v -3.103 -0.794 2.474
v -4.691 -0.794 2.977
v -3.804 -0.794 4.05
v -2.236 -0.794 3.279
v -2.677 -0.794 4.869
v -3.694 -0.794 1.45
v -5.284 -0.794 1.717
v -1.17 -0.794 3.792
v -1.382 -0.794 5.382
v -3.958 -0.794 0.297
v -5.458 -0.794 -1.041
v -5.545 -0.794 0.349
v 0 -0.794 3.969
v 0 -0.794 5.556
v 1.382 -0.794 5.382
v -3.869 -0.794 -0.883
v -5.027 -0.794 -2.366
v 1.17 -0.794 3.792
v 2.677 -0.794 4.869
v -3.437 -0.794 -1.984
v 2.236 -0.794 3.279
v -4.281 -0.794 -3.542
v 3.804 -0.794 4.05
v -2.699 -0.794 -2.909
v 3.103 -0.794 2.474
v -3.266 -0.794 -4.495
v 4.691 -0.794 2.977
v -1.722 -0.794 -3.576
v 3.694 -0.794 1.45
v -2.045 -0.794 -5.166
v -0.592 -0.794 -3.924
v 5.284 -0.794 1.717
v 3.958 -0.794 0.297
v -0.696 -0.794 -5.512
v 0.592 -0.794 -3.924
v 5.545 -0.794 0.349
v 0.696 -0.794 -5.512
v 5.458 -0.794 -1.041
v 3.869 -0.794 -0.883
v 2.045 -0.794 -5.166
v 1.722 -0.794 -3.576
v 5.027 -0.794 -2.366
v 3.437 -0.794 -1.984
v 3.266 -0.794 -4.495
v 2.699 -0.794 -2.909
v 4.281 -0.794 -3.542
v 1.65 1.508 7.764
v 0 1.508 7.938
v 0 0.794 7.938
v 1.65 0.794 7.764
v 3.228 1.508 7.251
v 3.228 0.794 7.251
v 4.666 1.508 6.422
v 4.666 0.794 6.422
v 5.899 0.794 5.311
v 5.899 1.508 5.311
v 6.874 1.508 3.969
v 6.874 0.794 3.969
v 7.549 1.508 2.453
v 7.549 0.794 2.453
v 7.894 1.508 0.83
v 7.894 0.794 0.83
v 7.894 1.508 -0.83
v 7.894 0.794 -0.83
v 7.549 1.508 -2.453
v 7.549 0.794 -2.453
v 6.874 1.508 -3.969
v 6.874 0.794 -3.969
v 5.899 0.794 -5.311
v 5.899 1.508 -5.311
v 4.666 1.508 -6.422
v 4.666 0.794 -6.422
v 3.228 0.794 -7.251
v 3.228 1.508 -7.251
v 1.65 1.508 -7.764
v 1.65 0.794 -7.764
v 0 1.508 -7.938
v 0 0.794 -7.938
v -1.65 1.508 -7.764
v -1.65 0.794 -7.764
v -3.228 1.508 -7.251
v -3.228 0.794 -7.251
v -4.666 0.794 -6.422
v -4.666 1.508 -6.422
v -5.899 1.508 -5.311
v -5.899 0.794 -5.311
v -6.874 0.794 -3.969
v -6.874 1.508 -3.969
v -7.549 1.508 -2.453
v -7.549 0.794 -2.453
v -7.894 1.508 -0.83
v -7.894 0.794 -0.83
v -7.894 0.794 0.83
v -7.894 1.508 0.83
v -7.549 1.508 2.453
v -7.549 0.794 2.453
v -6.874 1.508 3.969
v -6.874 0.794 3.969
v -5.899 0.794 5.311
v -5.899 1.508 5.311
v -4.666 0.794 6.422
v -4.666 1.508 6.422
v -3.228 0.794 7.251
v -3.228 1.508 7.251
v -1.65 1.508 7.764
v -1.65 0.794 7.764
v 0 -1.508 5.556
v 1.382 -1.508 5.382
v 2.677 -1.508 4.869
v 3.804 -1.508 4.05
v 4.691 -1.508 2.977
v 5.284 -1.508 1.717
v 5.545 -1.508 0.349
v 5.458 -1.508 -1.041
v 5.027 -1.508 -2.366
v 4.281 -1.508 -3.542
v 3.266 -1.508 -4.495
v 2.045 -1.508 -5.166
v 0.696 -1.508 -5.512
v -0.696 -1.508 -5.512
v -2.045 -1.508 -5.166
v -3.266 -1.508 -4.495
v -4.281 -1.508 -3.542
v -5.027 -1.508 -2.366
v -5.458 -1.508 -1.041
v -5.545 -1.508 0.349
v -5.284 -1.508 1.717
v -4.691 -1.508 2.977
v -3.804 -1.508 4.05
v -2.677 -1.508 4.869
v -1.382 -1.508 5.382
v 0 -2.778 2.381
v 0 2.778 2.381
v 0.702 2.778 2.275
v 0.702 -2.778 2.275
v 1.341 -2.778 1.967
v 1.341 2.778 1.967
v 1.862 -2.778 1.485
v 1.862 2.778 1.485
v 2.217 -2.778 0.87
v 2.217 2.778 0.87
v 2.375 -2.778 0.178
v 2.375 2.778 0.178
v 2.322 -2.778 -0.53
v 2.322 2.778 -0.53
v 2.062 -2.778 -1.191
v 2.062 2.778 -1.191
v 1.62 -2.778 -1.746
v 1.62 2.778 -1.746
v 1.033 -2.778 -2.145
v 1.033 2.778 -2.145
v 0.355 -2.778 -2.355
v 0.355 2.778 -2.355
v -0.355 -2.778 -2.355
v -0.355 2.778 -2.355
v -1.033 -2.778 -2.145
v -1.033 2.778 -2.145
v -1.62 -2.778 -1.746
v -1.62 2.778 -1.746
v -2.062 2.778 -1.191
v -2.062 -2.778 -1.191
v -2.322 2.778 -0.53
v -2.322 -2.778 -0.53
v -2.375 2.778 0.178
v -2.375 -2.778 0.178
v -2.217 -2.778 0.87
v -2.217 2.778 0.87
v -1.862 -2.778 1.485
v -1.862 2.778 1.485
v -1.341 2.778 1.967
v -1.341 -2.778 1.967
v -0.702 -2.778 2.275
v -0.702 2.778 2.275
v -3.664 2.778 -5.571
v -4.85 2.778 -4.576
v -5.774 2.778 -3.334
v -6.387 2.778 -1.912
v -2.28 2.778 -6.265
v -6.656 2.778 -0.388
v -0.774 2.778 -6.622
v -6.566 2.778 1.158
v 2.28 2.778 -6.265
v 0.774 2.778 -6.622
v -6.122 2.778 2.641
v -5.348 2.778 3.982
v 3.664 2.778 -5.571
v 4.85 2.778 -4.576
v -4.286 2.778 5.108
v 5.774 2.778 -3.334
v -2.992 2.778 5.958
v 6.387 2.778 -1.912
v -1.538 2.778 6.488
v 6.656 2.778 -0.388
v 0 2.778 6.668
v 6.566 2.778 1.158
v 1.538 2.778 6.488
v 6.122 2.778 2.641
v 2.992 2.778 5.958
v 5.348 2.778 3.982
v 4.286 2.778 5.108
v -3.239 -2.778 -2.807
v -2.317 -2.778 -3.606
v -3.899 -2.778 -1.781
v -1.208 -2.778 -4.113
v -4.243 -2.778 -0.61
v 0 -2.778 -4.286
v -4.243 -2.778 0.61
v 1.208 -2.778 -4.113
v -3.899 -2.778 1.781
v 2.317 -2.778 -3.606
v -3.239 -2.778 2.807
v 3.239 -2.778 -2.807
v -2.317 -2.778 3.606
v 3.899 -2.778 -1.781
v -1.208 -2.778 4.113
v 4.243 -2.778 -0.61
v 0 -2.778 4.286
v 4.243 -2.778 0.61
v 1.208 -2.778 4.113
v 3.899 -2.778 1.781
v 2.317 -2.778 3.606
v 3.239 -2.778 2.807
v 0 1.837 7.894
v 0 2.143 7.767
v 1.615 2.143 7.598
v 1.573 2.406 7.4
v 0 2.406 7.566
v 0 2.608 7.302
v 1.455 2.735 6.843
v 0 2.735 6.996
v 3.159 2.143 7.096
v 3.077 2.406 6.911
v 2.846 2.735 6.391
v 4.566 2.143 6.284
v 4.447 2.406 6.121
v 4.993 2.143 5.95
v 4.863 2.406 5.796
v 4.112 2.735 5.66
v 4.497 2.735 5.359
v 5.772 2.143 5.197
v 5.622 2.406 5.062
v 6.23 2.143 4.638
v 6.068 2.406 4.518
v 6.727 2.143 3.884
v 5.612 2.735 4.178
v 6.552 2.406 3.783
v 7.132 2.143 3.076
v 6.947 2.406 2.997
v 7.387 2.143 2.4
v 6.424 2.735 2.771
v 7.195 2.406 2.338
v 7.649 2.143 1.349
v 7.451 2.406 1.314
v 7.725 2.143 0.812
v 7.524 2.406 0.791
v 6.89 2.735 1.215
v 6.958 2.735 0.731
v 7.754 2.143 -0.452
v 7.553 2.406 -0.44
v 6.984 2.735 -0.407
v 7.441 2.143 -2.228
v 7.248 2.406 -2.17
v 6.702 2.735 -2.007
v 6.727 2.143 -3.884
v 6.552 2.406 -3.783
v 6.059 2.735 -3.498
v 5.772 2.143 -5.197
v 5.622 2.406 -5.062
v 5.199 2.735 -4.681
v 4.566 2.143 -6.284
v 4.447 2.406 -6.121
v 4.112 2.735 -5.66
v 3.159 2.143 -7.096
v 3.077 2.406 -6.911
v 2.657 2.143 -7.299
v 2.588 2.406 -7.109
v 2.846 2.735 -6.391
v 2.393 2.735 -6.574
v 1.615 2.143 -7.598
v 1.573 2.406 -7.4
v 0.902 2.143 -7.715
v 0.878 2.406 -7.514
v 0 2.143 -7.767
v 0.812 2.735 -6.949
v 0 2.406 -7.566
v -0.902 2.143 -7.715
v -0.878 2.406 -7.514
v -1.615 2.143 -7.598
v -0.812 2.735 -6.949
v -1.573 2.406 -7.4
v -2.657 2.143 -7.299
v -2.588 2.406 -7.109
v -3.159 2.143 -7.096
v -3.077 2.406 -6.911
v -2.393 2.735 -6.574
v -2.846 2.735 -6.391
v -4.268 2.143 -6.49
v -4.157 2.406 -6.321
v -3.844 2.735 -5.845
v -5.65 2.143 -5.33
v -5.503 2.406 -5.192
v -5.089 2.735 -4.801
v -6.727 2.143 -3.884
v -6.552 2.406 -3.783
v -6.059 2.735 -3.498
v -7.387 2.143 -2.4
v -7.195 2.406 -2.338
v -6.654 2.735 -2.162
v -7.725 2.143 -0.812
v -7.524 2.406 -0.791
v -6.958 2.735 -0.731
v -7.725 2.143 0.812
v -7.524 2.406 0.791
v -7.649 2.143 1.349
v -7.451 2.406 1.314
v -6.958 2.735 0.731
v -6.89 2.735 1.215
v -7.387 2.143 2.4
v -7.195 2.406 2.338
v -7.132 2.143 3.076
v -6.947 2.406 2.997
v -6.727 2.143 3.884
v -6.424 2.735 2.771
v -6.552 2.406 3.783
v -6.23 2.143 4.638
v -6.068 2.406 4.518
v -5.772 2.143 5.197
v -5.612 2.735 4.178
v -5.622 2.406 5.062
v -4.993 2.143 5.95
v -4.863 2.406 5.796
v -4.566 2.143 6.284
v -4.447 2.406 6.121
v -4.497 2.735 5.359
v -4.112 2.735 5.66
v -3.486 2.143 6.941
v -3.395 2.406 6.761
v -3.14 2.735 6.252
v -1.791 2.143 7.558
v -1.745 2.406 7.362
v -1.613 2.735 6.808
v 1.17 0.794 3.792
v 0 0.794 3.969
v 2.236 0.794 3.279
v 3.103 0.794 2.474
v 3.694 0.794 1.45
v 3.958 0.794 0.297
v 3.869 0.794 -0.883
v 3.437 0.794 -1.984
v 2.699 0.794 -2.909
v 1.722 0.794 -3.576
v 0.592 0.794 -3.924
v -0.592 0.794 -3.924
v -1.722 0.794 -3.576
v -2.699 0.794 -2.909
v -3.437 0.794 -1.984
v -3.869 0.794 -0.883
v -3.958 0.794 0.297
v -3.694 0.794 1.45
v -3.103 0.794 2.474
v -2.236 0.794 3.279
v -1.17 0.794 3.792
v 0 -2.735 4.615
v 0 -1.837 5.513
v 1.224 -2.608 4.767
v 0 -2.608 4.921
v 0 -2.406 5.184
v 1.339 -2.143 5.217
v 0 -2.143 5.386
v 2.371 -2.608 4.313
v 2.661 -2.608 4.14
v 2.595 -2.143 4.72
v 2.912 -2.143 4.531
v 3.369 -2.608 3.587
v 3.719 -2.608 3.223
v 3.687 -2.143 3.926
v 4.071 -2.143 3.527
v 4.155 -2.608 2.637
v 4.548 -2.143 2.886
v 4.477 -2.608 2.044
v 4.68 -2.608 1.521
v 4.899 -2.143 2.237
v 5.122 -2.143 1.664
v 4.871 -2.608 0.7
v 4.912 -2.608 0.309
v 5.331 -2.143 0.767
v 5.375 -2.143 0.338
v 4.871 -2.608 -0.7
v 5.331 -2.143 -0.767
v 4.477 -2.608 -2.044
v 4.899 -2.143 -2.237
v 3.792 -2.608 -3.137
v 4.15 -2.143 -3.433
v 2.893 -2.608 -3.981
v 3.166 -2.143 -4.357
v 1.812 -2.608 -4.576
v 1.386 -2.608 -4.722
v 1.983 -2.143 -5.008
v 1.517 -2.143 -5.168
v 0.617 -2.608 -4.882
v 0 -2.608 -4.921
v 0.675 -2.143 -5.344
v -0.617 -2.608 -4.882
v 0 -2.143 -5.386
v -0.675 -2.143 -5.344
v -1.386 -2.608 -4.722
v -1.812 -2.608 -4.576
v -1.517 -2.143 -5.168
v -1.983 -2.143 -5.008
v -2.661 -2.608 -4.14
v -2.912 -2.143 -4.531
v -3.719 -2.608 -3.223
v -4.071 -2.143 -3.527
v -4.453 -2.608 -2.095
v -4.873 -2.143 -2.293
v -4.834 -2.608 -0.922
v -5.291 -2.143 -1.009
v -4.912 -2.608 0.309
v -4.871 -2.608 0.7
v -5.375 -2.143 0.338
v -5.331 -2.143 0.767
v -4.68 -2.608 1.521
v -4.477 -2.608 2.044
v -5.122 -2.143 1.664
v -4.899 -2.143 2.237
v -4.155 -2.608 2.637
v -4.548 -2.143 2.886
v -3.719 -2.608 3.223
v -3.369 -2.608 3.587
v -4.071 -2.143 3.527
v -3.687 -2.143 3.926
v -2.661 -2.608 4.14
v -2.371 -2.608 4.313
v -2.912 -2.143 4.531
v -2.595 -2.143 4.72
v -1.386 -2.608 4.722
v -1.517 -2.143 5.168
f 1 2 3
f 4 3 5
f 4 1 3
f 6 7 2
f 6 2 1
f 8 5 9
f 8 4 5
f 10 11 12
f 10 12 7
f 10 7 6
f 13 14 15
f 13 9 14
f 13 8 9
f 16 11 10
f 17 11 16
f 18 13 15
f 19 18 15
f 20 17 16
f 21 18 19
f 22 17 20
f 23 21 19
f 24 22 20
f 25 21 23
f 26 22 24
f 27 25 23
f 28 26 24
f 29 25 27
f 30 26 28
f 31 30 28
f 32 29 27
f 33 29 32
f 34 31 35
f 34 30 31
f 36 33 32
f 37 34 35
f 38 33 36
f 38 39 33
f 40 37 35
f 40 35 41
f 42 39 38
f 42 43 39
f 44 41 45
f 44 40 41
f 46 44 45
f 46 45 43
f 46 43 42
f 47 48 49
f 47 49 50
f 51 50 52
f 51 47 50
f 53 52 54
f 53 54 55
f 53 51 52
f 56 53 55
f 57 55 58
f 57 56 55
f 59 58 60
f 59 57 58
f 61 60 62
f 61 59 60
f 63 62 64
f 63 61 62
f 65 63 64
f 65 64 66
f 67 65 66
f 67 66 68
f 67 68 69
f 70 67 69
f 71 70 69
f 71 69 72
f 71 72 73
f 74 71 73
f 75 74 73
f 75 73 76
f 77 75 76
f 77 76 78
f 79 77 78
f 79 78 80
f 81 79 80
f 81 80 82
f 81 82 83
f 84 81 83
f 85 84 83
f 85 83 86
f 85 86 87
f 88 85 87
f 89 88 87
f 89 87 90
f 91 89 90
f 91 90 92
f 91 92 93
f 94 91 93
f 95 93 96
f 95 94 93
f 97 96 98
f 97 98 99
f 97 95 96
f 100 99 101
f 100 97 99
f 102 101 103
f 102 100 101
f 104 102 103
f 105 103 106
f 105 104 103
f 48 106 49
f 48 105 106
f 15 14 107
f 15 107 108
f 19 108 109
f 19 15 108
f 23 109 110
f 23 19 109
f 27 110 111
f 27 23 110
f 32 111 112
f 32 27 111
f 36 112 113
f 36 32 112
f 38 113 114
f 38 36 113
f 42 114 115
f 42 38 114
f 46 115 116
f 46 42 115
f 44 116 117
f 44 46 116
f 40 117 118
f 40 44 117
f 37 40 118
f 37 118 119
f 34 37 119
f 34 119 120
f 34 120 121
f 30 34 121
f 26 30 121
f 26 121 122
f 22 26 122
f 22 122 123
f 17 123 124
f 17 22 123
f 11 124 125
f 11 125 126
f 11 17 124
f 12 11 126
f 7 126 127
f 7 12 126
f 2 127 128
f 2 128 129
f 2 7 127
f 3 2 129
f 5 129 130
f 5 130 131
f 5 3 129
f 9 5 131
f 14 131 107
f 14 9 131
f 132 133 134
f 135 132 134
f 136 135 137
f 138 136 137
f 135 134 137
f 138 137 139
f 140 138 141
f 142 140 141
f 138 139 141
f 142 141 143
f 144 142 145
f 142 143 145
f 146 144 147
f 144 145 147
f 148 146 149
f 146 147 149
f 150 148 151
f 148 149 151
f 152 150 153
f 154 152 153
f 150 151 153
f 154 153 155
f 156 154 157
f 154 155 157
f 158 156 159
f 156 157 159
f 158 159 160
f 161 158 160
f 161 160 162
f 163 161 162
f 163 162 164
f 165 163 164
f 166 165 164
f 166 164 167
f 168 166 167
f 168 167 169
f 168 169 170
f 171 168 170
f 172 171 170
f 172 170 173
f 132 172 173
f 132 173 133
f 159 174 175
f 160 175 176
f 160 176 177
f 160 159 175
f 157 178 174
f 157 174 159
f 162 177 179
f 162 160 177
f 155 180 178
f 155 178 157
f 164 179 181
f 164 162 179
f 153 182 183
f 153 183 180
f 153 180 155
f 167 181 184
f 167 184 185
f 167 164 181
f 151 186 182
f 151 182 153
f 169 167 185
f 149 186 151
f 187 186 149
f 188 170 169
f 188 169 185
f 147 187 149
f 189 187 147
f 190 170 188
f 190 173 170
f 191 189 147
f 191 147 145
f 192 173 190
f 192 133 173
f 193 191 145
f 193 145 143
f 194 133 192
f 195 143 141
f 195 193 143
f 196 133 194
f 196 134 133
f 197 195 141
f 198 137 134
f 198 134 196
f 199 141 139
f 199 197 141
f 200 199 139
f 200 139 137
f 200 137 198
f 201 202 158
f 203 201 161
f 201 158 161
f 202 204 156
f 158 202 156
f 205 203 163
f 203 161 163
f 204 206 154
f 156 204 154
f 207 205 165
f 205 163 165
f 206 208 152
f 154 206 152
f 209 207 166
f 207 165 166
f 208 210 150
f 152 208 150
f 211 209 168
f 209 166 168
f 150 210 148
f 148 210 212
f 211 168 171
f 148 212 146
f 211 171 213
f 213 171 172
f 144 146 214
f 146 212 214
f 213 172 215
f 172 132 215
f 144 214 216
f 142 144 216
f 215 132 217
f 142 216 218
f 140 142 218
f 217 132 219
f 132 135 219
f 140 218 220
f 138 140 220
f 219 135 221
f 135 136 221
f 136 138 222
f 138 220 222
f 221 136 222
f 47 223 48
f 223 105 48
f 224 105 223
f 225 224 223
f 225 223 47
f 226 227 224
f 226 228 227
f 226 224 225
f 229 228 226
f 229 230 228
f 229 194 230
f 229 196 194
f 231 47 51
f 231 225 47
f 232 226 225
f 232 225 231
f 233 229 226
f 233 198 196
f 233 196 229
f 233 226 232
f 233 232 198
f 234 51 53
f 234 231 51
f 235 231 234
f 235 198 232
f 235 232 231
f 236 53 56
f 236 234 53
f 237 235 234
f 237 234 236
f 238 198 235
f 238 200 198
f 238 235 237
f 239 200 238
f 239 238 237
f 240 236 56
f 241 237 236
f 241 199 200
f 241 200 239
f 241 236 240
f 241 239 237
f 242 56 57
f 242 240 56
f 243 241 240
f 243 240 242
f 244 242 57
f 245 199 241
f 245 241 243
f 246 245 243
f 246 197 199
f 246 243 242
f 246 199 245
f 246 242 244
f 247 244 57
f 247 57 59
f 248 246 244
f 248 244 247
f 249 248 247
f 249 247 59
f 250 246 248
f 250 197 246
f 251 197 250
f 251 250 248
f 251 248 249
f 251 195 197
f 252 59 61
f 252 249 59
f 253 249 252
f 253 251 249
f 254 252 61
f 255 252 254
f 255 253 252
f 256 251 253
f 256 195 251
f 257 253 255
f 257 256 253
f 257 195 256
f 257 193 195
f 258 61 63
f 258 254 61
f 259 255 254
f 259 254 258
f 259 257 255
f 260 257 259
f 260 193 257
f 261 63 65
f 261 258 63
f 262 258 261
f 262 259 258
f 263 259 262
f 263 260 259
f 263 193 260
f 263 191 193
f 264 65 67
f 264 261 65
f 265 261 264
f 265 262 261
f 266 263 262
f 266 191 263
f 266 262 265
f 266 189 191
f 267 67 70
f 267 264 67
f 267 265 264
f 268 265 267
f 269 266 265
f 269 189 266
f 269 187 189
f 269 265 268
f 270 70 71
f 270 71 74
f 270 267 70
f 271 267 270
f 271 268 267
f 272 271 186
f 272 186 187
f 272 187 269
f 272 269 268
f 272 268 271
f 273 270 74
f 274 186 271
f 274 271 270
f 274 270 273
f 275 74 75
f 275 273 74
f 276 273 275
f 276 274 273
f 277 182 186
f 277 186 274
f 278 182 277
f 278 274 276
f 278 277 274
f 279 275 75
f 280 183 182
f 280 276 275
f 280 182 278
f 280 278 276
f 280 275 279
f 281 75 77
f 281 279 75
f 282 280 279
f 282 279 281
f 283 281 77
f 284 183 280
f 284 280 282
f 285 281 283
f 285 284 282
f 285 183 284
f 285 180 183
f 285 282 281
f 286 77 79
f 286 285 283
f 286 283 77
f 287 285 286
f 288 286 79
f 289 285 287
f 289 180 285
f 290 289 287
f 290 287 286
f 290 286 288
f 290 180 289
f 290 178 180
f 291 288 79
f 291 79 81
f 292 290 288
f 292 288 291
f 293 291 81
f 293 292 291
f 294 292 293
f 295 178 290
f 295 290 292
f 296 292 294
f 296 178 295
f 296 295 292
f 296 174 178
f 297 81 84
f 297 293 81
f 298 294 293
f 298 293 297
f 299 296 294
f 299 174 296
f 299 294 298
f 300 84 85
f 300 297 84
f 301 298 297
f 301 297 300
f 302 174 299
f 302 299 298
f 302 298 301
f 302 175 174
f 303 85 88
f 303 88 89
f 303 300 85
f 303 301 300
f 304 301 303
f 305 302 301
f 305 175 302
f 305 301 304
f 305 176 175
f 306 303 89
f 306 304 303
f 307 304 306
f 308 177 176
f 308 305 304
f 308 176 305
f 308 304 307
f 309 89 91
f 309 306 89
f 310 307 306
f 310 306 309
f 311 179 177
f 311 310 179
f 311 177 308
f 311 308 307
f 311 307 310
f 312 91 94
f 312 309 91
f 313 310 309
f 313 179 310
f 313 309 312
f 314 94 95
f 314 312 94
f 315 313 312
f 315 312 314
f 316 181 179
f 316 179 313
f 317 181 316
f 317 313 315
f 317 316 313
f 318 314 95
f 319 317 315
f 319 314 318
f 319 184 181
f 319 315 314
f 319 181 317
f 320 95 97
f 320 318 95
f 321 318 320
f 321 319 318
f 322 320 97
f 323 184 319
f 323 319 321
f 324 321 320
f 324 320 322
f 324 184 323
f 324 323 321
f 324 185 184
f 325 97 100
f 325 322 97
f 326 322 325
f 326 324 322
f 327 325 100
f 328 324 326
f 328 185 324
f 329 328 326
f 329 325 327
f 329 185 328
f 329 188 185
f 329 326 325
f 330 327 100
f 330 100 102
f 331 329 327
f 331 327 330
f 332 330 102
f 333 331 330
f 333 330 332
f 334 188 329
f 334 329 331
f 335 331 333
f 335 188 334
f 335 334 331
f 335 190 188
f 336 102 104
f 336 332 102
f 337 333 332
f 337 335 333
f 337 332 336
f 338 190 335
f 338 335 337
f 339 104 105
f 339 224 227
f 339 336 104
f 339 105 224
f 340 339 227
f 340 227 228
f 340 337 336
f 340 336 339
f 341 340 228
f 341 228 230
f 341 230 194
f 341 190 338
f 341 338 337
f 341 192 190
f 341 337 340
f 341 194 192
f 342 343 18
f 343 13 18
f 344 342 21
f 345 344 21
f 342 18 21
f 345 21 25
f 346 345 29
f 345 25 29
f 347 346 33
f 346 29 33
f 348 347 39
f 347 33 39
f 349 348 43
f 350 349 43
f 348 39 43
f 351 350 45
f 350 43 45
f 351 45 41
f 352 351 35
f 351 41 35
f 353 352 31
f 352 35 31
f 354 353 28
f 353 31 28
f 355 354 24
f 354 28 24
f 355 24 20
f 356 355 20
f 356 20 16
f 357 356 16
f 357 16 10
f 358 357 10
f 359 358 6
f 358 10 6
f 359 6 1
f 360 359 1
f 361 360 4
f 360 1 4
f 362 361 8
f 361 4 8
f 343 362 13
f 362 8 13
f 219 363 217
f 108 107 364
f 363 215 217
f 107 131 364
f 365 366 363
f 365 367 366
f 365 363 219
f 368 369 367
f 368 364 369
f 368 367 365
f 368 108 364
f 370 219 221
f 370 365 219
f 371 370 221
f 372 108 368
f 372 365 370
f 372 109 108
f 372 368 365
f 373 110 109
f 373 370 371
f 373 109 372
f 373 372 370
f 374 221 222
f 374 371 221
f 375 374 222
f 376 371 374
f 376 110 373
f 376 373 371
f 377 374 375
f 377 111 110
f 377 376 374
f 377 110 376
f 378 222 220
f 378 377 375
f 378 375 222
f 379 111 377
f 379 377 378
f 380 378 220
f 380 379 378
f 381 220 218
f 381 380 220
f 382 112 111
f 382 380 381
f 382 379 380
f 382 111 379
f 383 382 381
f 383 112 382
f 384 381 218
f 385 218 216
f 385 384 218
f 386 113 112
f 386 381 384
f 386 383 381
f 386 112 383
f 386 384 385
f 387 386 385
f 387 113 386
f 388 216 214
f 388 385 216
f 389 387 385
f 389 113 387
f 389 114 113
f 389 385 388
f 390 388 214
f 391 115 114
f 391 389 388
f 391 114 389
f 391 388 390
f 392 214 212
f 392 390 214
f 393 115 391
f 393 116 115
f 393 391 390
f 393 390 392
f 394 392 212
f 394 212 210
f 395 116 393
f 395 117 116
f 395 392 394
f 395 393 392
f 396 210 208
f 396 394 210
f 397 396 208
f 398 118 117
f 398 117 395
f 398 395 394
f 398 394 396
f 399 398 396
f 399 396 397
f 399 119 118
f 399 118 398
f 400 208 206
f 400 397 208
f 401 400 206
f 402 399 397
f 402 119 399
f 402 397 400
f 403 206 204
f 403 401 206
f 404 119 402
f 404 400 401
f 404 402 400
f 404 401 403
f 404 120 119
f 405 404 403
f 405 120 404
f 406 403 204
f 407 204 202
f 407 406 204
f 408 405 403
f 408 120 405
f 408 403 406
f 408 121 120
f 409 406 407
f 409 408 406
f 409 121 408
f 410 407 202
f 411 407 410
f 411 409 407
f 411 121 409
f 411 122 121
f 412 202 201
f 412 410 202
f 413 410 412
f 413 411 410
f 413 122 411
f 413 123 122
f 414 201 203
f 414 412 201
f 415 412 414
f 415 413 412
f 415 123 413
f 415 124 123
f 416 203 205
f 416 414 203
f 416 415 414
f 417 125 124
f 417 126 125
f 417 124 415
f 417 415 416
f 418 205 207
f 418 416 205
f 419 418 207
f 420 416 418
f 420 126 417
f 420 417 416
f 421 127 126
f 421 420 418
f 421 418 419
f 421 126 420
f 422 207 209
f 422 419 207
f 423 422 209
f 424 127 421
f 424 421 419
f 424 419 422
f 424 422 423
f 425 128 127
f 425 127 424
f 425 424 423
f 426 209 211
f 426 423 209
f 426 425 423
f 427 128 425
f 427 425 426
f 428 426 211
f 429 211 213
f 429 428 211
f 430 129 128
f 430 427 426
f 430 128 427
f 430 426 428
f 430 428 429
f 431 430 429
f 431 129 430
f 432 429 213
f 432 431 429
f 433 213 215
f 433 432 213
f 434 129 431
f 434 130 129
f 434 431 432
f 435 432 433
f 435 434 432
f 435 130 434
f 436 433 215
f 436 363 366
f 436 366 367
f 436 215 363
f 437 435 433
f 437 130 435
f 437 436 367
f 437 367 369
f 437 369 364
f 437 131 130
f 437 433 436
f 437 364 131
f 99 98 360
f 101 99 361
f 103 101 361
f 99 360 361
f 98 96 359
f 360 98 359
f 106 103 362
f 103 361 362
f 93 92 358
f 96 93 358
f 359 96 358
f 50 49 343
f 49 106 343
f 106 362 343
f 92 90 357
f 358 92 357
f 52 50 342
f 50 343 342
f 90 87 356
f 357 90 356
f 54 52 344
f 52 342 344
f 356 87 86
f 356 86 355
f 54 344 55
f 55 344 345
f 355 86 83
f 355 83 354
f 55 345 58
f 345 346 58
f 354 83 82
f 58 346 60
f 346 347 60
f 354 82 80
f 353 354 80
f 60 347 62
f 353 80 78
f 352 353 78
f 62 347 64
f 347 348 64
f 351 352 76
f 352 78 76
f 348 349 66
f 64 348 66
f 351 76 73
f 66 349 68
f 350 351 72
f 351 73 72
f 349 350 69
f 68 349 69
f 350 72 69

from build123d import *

# Parameters (mm, degrees)
SKETCH1_R           = 5.55625
BOSS_EXTRUDE1_DEPTH = 2.778125
SKETCH2_R           = 7.9375
BOSS_EXTRUDE2_DEPTH = 2.54
SKETCH3_R           = 8.070808391
SKETCH3_R_2         = 3.96875
CUT_EXTRUDE1_DEPTH  = 0.79375
SKETCH4_R           = 2.38125
CUT_EXTRUDE2_DEPTH  = 13.525163734
FILLET1_R           = 1.27


with BuildPart() as part:
    # Sketch1 → Boss-Extrude1 (new, symmetric)
    with BuildSketch(Plane(origin=(0, 0, 0), x_dir=(1, 0, 0), z_dir=(0, 1, 0))):
        with Locations(Location((0, 0, 0), (0, 0, 270))):
            Circle(SKETCH1_R)
    extrude(amount=BOSS_EXTRUDE1_DEPTH, both=True)

    # Sketch2 → Boss-Extrude2 (add)
    with BuildSketch(Plane(origin=(0, 2.778125, 0), x_dir=(1, 0, 0), z_dir=(0, 1, 0))):
        with Locations(Location((0, 0, 0), (0, 0, 270))):
            Circle(SKETCH2_R)
    extrude(amount=-BOSS_EXTRUDE2_DEPTH)

    # Sketch3 → Cut-Extrude1 (cut, symmetric)
    with BuildSketch(Plane(origin=(0, 0, 0), x_dir=(1, 0, 0), z_dir=(0, 1, 0))):
        Circle(SKETCH3_R)
        with Locations(Location((0, 0, 0), (0, 0, 270))):
            Circle(SKETCH3_R_2, mode=Mode.SUBTRACT)
    extrude(amount=CUT_EXTRUDE1_DEPTH, both=True, mode=Mode.SUBTRACT)

    # Sketch4 → Cut-Extrude2 (cut, through all)
    with BuildSketch(Plane(origin=(0, 2.778125, 0), x_dir=(1, 0, 0), z_dir=(0, 1, 0))):
        with Locations(Location((0, 0, 0), (0, 0, 270))):
            Circle(SKETCH4_R)
    extrude(amount=-CUT_EXTRUDE2_DEPTH, mode=Mode.SUBTRACT)

    # Fillet1
    fillet1_edges = [part.edges().sort_by_distance(p)[0] for p in [
        (0, -2.778125, -5.55625),
        (0, 2.778125, -7.9375),
    ]]
    fillet(fillet1_edges, radius=FILLET1_R)


solid = part.part
